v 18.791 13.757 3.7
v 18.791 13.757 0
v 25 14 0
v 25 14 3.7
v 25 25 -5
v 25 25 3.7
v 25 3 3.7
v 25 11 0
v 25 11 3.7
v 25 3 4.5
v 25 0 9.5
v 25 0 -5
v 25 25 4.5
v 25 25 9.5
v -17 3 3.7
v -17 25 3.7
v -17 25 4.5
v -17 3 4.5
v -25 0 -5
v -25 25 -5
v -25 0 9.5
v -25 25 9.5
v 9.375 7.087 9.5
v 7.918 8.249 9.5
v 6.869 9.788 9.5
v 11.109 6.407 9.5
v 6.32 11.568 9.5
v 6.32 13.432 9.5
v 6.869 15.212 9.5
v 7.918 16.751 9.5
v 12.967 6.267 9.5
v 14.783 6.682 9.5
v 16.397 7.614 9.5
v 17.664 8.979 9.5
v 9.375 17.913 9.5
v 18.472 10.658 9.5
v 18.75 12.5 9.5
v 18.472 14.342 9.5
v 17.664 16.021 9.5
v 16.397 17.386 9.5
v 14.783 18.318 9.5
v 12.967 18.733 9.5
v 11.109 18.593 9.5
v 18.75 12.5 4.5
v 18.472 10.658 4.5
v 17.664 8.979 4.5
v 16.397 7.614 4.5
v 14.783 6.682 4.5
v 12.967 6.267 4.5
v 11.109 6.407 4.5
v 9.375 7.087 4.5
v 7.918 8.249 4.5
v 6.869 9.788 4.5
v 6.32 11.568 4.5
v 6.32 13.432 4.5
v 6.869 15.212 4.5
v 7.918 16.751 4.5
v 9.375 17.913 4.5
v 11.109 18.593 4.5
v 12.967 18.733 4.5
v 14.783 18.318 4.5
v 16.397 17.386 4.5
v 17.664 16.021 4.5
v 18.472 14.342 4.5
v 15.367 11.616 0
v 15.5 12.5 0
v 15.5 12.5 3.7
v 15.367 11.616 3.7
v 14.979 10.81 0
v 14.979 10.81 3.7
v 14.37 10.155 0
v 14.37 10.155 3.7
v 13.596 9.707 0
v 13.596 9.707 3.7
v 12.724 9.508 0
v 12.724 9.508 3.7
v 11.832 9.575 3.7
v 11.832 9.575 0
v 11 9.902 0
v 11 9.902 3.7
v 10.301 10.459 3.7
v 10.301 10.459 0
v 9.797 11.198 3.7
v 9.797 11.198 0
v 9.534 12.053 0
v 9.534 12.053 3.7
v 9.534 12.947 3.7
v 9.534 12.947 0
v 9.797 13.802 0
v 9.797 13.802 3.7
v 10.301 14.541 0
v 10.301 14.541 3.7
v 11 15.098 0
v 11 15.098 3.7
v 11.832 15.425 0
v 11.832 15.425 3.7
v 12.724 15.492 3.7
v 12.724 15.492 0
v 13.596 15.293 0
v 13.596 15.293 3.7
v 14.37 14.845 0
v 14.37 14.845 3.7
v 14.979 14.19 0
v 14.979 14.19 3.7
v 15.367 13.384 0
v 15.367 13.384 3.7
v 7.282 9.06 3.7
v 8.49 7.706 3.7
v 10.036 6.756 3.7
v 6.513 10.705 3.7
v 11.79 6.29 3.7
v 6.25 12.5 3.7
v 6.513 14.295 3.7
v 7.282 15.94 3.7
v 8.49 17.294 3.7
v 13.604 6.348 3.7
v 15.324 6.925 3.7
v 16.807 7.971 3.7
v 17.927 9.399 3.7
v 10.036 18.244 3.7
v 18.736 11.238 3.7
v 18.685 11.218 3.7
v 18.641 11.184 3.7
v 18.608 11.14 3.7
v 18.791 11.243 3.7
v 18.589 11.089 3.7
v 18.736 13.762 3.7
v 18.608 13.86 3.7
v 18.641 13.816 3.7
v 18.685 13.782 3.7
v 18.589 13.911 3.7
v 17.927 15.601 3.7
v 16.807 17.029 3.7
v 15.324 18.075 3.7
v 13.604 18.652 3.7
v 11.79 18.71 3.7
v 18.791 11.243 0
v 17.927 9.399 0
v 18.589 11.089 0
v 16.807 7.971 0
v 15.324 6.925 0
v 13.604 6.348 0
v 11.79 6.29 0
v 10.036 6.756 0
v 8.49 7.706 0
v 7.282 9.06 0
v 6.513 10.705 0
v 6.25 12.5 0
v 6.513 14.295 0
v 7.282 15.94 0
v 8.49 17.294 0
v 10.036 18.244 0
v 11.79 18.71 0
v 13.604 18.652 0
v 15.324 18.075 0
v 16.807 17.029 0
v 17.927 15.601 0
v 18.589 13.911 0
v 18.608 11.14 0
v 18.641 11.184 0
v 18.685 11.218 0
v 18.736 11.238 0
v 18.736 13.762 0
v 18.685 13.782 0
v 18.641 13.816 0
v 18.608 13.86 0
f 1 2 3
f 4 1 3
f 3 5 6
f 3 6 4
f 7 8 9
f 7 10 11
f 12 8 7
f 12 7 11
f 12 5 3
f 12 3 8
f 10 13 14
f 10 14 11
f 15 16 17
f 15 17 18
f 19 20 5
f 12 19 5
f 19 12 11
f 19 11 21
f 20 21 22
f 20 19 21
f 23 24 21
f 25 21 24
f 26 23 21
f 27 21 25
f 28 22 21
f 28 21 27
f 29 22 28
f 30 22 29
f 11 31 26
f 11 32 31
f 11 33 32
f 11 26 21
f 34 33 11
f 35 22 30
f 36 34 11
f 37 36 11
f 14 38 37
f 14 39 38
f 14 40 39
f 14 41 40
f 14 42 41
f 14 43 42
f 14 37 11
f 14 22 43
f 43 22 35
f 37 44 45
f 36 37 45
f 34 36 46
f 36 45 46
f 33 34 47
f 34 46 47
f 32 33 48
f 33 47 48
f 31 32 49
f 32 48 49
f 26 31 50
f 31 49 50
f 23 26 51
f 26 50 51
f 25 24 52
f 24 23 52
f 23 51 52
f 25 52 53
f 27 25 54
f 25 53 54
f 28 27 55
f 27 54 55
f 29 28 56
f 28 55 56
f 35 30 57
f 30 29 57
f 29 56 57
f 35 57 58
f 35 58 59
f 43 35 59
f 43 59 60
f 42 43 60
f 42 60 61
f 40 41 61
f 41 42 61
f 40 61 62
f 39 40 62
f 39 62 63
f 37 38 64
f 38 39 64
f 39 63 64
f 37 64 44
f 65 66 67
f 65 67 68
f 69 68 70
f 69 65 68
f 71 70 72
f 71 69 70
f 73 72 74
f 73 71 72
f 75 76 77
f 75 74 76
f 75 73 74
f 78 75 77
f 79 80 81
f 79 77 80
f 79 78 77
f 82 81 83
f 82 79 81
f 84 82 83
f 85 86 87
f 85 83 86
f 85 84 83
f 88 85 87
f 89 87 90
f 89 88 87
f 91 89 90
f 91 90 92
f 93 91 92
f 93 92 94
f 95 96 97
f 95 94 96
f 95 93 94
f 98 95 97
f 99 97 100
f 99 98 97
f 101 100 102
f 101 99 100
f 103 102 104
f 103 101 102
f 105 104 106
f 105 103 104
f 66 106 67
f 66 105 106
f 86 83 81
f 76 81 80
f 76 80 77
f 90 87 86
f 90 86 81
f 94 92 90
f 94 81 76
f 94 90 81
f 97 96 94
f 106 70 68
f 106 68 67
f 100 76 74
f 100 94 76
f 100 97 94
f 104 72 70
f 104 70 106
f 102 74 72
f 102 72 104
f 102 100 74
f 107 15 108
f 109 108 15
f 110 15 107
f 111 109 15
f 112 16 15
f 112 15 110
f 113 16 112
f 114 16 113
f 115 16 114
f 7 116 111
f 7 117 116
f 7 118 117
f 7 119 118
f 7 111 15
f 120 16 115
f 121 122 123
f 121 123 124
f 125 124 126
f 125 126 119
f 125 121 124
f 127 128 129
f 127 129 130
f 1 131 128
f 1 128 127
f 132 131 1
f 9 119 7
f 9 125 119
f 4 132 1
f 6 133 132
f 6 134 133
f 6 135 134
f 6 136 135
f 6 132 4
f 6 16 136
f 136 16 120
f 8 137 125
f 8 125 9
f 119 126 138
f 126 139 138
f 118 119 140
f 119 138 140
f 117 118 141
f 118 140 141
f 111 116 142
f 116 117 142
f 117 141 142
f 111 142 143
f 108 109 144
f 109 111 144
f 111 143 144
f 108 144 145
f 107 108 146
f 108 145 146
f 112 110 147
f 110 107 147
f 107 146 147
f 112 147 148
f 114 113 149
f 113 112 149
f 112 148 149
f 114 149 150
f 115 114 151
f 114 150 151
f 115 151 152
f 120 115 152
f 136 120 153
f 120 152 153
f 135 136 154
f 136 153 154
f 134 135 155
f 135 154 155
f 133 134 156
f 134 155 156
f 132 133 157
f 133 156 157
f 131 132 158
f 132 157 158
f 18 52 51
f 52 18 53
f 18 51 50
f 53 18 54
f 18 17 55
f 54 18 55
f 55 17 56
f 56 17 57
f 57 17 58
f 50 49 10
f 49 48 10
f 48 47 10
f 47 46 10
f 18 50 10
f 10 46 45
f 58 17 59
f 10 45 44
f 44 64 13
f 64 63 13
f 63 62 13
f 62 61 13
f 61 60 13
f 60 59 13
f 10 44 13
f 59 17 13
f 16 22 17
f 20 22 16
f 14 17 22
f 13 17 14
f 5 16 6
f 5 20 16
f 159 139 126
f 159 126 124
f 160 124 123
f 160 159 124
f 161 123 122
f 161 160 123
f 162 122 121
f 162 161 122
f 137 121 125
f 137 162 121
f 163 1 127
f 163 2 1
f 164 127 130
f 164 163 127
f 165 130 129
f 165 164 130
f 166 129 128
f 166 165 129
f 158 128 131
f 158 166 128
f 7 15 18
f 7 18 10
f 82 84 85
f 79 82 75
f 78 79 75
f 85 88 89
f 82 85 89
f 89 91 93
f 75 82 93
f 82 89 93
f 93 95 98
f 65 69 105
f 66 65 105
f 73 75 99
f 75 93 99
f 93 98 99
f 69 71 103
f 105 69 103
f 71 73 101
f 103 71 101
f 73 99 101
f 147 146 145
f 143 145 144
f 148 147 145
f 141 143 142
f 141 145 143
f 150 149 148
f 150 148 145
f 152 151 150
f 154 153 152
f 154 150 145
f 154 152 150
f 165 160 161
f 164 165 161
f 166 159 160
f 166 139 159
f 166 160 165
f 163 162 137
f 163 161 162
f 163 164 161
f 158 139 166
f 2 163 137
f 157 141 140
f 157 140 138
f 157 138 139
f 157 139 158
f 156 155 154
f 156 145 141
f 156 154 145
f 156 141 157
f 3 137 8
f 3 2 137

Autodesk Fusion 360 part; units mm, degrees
sketch "スケッチ1" plane through (0, 0, 0) normal (0, 0, 1) x (1, 0, 0)
  circle A0 centre (12.5, 12.5) radius 3
  line L0 (18.7913, 13.7566) -> (25, 14)
  line L1 (12.5, 12.5) -> (14, 12.5)
  line L2 (18.7913, 11.2434) -> (25, 11)
  arc A1 (18.5886, 13.9113) -> (18.5886, 11.0887) centre (12.5, 12.5) ccw
  line L3 (25, 0) -> (25, 11)
  line L4 (25, 14) -> (25, 25)
  arc A2 (18.5886, 13.9113) -> (18.7913, 13.7566) centre (18.7834, 13.9564) ccw
  arc A3 (18.7913, 11.2434) -> (18.5886, 11.0887) centre (18.7834, 11.0436) ccw
  line L5 (25, 0) -> (-25, 0)
  line L6 (-25, 0) -> (-25, 25)
  line L7 (-25, 25) -> (25, 25)
  point P0 (18.6237, 13.75)
  point P1 (18.6237, 11.25)
  point P2 (25, 12.5)
  dimension "d3" = 12.5
  dimension "d4" = 6
  dimension "d5" = 2.5
  dimension "d6" = 1.5
  dimension "d7" = 0.2
  dimension "d8" = 0.2
extrude "押し出し1" add sketch "スケッチ1" along normal blind 4 makes body 1 at (-14.5775, 12.6555, 0) makes body 2 at (15.4963, 12.3505, 2.6667)
sketch "スケッチ2" plane through (0, 0, 0) normal (0, 0, 1) x (1, 0, 0)
  line L0 (-25, 25) -> (25, 25)
  line L1 (25, 25) -> (25, 0)
  line L2 (25, 0) -> (-25, 0)
  line L3 (-25, 0) -> (-25, 25)
extrude "押し出し2" add sketch "スケッチ2" against normal blind 5 separate body makes body 3
sketch "スケッチ3" plane through (0, 0, 0) normal (0, 0, 1) x (1, 0, 0)
  line L0 (-25, 25) -> (-17, 25)
  line L1 (-17, 25) -> (-17, 3)
  line L2 (-17, 0) -> (-25, 0)
  line L3 (-25, 0) -> (-25, 25)
  line L4 (-17, 3) -> (25, 3)
  line L5 (25, 3) -> (25, 0)
  line L6 (25, 0) -> (-17, 0)
extrude "押し出し3" add sketch "スケッチ3" along normal blind 1 separate body makes body 4
move_body "移動1" bodies 4 to x (1, 0, 0) y (0, 1, 0) z (0, 0, 1) at (0, 0, 4)
sketch "スケッチ4" plane through (0, 0, 0) normal (0, 0, 1) x (1, 0, 0)
  line L0 (-25, 25) -> (25, 25)
  line L1 (25, 25) -> (25, 0)
  line L2 (25, 0) -> (-25, 0)
  line L3 (-25, 0) -> (-25, 25)
  circle A0 centre (12.5, 12.5) radius 6.25
  dimension "d15" = 12.5
extrude "押し出し4" add sketch "スケッチ4" along normal blind 5 separate body makes body 5
move_body "移動2" bodies 5 to x (1, 0, 0) y (0, 1, 0) z (0, 0, 1) at (0, 0, 5)
extrude "押し出し5" cut 1 faces at (-22.3333, 9.3333, 5) along direction (0, 0, -1) blind 0.2 on bodies 4 bodies 4
extrude "押し出し6" cut 2 faces at (-14.5775, 12.6555, 4) (11.4364, 13.3482, 4) along direction (0, 0, -1) blind 0.3 on bodies 1 2 bodies 1 2
move_body "移動3" bodies 4 to x (1, 0, 0) y (0, 1, 0) z (0, 0, 1) at (0, 0, -0.3)
move_body "移動4" bodies 5 to x (1, 0, 0) y (0, 1, 0) z (0, 0, 1) at (0, 0, -0.5)
combine "結合1" operation add target body 3 tool bodies 1
combine "結合2" operation add target body 3 tool bodies 4
combine "結合3" operation add target body 3 tool bodies 5
